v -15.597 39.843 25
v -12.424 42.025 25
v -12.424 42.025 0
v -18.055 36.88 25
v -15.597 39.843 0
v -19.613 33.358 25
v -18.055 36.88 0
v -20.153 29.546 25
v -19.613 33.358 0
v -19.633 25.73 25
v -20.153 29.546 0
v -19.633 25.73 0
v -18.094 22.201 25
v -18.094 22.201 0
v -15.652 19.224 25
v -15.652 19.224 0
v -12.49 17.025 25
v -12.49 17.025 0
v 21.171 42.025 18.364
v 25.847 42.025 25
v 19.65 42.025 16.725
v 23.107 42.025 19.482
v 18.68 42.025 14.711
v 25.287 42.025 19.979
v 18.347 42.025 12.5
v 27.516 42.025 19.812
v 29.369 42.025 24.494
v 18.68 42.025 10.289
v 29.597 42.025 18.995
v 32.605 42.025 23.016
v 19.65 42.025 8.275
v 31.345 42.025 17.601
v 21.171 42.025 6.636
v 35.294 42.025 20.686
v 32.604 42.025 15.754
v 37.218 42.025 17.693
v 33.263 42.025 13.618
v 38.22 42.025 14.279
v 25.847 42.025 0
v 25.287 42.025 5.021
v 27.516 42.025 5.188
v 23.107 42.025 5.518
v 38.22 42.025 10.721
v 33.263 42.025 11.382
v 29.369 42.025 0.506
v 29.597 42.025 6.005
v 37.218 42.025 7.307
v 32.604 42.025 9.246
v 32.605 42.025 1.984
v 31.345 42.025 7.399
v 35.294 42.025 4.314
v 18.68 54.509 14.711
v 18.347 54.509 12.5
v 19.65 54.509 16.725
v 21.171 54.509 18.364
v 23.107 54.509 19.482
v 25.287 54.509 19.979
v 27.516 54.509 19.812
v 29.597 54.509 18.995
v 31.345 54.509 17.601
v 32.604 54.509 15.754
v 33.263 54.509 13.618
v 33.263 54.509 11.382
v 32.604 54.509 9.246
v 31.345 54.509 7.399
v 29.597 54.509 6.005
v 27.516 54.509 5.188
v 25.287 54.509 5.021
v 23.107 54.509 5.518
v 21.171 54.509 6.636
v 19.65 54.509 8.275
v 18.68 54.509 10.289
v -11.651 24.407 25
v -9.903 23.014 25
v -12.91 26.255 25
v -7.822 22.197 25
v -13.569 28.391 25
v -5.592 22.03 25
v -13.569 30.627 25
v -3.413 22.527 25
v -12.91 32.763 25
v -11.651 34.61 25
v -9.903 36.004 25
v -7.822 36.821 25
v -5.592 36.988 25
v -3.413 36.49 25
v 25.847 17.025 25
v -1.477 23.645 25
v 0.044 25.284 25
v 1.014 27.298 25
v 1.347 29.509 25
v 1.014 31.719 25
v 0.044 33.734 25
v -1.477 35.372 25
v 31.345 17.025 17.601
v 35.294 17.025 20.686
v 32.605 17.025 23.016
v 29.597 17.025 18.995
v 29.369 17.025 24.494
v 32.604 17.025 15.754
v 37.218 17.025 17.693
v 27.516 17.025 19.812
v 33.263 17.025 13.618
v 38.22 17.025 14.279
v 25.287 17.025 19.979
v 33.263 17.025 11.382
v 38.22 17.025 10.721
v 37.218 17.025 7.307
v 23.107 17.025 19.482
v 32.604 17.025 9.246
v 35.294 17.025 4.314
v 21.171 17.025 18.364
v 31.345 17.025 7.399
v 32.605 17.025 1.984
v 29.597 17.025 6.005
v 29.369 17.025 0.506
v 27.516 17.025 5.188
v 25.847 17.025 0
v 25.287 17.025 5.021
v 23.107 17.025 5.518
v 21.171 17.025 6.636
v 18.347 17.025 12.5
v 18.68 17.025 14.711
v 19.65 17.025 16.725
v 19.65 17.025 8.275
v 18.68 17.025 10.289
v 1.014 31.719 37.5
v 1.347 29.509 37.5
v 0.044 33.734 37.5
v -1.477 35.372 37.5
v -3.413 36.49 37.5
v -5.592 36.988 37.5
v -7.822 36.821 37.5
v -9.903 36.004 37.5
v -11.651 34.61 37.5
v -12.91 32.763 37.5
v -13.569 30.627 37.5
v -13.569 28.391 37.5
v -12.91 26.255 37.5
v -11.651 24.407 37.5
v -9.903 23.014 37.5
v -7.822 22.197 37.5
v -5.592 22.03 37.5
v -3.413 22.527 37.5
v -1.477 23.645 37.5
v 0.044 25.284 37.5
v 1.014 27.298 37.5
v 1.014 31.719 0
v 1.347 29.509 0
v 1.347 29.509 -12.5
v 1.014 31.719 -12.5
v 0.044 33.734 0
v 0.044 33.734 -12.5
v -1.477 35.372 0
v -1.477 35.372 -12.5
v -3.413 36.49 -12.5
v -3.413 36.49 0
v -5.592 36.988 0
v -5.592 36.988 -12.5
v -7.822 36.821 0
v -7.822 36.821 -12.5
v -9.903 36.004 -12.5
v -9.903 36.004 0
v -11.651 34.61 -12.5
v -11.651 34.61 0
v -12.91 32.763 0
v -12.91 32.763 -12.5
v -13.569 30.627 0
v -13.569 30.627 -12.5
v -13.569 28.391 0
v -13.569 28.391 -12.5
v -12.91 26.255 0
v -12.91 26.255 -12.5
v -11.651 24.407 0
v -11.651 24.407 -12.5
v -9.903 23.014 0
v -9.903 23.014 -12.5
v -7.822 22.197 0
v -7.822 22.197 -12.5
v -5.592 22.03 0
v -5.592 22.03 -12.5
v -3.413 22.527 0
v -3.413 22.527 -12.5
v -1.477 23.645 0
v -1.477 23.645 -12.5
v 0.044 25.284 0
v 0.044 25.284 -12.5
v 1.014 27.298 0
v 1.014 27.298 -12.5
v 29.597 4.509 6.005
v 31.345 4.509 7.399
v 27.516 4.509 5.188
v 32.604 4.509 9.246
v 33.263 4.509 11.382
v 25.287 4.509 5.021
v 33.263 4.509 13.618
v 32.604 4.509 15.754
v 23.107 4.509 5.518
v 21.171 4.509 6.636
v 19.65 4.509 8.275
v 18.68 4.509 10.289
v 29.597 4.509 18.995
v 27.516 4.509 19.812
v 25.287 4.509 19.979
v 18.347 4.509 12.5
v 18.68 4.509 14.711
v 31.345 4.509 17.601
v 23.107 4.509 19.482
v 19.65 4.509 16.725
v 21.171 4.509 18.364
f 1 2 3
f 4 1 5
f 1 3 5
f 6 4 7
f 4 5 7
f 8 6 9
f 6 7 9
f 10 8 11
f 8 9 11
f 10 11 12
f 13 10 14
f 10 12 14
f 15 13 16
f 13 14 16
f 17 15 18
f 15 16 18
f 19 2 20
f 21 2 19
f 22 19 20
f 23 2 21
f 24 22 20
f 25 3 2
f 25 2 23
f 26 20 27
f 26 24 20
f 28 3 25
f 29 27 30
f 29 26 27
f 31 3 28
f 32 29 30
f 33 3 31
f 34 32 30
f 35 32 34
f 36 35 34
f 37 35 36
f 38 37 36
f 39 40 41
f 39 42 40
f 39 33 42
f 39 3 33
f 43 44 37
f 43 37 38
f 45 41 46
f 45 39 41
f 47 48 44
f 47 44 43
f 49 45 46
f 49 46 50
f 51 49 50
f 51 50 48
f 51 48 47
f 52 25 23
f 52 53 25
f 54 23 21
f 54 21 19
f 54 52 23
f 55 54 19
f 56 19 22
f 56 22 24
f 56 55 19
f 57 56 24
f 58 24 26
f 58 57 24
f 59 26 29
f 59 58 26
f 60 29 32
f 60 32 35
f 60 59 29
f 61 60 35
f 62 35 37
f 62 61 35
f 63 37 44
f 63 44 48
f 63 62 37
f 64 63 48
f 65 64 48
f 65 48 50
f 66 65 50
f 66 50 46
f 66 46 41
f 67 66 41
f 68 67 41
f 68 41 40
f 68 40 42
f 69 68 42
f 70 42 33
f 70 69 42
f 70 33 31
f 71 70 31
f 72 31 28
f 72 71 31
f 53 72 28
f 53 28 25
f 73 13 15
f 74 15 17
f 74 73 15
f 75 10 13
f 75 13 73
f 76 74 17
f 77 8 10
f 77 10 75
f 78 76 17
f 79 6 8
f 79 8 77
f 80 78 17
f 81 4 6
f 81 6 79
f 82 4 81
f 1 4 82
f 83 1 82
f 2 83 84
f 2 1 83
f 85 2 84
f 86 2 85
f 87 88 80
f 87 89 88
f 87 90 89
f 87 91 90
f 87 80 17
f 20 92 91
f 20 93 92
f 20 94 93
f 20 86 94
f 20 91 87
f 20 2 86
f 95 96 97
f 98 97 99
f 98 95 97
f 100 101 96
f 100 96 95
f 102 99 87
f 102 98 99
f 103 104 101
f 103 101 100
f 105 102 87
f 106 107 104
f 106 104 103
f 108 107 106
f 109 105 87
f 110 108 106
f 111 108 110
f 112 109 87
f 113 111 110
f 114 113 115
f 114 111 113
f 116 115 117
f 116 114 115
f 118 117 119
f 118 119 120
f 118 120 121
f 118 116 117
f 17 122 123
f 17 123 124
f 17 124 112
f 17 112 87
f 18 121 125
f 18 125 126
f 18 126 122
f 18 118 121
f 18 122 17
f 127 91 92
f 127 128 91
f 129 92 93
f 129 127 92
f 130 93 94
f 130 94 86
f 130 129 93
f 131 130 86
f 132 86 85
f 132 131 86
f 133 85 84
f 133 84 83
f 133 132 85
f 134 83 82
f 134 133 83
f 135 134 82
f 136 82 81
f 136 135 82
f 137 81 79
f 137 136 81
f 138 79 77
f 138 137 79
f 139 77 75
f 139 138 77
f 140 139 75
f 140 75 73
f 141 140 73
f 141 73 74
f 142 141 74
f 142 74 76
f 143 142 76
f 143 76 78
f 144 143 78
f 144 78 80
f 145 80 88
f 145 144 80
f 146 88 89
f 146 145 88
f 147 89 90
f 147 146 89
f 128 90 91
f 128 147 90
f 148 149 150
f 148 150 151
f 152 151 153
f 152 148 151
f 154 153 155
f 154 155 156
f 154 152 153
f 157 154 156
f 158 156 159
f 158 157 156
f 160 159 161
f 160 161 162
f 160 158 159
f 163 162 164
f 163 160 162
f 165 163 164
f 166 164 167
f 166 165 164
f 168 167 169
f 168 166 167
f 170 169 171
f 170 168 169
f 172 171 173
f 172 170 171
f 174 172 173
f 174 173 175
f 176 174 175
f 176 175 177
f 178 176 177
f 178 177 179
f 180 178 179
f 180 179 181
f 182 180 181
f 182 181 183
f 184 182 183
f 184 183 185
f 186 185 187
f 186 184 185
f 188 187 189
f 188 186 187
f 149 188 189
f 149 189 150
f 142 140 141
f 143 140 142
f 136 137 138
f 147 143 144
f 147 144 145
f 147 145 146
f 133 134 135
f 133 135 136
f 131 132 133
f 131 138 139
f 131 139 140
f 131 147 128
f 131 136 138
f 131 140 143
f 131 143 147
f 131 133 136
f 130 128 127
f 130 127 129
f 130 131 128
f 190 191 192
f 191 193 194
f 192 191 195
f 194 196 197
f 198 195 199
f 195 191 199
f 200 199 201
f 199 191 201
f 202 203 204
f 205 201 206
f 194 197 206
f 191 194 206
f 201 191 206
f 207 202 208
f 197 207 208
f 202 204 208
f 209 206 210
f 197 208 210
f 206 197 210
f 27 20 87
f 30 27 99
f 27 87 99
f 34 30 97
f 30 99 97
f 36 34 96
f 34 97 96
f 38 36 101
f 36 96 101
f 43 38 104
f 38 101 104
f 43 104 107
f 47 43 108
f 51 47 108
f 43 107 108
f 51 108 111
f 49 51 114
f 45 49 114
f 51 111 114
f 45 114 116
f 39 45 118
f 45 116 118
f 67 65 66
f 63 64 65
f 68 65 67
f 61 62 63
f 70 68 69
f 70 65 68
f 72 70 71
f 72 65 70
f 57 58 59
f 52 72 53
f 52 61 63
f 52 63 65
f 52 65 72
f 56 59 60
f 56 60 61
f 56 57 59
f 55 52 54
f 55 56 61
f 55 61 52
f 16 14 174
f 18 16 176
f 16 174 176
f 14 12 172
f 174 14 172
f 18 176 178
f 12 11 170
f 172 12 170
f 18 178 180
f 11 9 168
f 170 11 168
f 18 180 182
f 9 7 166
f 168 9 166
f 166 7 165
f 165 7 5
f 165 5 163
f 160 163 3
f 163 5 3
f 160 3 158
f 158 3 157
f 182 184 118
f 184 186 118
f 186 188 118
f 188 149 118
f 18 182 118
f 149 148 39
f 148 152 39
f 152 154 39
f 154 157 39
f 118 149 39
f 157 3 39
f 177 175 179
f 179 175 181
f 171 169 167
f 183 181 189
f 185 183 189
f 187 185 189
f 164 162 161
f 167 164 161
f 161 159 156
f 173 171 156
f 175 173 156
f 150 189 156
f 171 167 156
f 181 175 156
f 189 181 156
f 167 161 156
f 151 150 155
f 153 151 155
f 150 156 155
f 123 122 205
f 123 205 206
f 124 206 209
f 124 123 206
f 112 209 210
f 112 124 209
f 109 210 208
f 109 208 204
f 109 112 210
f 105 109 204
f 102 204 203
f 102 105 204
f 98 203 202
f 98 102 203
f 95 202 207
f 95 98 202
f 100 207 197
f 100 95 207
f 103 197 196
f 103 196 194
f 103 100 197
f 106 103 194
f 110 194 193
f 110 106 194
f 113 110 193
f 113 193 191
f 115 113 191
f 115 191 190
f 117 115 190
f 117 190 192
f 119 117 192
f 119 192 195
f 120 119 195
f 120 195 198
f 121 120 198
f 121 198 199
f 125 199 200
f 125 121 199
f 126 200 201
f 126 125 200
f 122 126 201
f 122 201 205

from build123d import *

# Parameters (mm, degrees)
SALIENTE_EXTRUIR1_DEPTH = 25
CORTAR_EXTRUIR1_DEPTH   = 60
CORTAR_EXTRUIR2_DEPTH   = 50
CROQUIS16_R             = 7.5
SALIENTE_EXTRUIR4_DEPTH = 25
CROQUIS19_R             = 7.5
SALIENTE_EXTRUIR5_DEPTH = 25


with BuildPart() as part:
    # Croquis1 → Saliente-Extruir1 (new body)
    with BuildSketch(Plane.XY):
        with BuildLine():
            Line((38.847221771, 29.508698958), (38.847221771, 42.008698958))
            Line((38.847221771, 42.008698958), (-6.152778229, 43.508698958))
            ThreePointArc((-6.152778229, 43.508698958), (-20.152778229, 29.508698958), (-6.152778229, 15.508698958))
            Line((-6.152778229, 15.508698958), (38.847221771, 17.008698958))
            Line((38.847221771, 17.008698958), (38.847221771, 29.508698958))
        make_face()
    extrude(amount=SALIENTE_EXTRUIR1_DEPTH)

    # Croquis5 → Cortar-Extruir1 (cut)
    with BuildSketch(Plane(origin=(0, 0, 0), x_dir=(1, 0, 0), z_dir=(0, 1, 0))):
        with BuildLine():
            Line((25.847221771, 0), (38.847221771, 0))
            Line((38.847221771, 0), (38.847221771, -25))
            Line((38.847221771, -25), (25.847221771, -25))
            ThreePointArc((25.847221771, -25), (38.347221771, -12.5), (25.847221771, 0))
        make_face()
    extrude(amount=CORTAR_EXTRUIR1_DEPTH, mode=Mode.SUBTRACT)

    # Croquis14 → Cortar-Extruir2 (cut)
    with BuildSketch(Plane.XY):
        Polygon((53.899517017, 17.025365624), (35.13924076, 17.025365624), (-30.270251596, 17.025365624), (-30.270251596, 4.764452962), (53.899517017, 4.764452962), align=None)
        Polygon((-30.270251596, 42.025365624), (38.347221771, 42.025365624), (49.932931428, 42.025365624), (49.932931428, 48.139642848), (-30.270251596, 48.139642848), align=None)
    extrude(amount=CORTAR_EXTRUIR2_DEPTH, mode=Mode.SUBTRACT)

    # Croquis16 → Saliente-Extruir4 (add, symmetric)
    with BuildSketch(Plane(origin=(0, 29.508698958, 0), x_dir=(1, 0, 0), z_dir=(0, 1, 0))):
        with Locations(Location((25.847221771, -12.5, 0), (0, 0, 180))):
            Circle(CROQUIS16_R)
    extrude(amount=SALIENTE_EXTRUIR4_DEPTH, both=True)

    # Croquis19 → Saliente-Extruir5 (add, symmetric)
    with BuildSketch(Plane.XY.offset(12.5)):
        with Locations((-6.152778229, 29.508698958)):
            Circle(CROQUIS19_R)
    extrude(amount=SALIENTE_EXTRUIR5_DEPTH, both=True)


solid = part.part
